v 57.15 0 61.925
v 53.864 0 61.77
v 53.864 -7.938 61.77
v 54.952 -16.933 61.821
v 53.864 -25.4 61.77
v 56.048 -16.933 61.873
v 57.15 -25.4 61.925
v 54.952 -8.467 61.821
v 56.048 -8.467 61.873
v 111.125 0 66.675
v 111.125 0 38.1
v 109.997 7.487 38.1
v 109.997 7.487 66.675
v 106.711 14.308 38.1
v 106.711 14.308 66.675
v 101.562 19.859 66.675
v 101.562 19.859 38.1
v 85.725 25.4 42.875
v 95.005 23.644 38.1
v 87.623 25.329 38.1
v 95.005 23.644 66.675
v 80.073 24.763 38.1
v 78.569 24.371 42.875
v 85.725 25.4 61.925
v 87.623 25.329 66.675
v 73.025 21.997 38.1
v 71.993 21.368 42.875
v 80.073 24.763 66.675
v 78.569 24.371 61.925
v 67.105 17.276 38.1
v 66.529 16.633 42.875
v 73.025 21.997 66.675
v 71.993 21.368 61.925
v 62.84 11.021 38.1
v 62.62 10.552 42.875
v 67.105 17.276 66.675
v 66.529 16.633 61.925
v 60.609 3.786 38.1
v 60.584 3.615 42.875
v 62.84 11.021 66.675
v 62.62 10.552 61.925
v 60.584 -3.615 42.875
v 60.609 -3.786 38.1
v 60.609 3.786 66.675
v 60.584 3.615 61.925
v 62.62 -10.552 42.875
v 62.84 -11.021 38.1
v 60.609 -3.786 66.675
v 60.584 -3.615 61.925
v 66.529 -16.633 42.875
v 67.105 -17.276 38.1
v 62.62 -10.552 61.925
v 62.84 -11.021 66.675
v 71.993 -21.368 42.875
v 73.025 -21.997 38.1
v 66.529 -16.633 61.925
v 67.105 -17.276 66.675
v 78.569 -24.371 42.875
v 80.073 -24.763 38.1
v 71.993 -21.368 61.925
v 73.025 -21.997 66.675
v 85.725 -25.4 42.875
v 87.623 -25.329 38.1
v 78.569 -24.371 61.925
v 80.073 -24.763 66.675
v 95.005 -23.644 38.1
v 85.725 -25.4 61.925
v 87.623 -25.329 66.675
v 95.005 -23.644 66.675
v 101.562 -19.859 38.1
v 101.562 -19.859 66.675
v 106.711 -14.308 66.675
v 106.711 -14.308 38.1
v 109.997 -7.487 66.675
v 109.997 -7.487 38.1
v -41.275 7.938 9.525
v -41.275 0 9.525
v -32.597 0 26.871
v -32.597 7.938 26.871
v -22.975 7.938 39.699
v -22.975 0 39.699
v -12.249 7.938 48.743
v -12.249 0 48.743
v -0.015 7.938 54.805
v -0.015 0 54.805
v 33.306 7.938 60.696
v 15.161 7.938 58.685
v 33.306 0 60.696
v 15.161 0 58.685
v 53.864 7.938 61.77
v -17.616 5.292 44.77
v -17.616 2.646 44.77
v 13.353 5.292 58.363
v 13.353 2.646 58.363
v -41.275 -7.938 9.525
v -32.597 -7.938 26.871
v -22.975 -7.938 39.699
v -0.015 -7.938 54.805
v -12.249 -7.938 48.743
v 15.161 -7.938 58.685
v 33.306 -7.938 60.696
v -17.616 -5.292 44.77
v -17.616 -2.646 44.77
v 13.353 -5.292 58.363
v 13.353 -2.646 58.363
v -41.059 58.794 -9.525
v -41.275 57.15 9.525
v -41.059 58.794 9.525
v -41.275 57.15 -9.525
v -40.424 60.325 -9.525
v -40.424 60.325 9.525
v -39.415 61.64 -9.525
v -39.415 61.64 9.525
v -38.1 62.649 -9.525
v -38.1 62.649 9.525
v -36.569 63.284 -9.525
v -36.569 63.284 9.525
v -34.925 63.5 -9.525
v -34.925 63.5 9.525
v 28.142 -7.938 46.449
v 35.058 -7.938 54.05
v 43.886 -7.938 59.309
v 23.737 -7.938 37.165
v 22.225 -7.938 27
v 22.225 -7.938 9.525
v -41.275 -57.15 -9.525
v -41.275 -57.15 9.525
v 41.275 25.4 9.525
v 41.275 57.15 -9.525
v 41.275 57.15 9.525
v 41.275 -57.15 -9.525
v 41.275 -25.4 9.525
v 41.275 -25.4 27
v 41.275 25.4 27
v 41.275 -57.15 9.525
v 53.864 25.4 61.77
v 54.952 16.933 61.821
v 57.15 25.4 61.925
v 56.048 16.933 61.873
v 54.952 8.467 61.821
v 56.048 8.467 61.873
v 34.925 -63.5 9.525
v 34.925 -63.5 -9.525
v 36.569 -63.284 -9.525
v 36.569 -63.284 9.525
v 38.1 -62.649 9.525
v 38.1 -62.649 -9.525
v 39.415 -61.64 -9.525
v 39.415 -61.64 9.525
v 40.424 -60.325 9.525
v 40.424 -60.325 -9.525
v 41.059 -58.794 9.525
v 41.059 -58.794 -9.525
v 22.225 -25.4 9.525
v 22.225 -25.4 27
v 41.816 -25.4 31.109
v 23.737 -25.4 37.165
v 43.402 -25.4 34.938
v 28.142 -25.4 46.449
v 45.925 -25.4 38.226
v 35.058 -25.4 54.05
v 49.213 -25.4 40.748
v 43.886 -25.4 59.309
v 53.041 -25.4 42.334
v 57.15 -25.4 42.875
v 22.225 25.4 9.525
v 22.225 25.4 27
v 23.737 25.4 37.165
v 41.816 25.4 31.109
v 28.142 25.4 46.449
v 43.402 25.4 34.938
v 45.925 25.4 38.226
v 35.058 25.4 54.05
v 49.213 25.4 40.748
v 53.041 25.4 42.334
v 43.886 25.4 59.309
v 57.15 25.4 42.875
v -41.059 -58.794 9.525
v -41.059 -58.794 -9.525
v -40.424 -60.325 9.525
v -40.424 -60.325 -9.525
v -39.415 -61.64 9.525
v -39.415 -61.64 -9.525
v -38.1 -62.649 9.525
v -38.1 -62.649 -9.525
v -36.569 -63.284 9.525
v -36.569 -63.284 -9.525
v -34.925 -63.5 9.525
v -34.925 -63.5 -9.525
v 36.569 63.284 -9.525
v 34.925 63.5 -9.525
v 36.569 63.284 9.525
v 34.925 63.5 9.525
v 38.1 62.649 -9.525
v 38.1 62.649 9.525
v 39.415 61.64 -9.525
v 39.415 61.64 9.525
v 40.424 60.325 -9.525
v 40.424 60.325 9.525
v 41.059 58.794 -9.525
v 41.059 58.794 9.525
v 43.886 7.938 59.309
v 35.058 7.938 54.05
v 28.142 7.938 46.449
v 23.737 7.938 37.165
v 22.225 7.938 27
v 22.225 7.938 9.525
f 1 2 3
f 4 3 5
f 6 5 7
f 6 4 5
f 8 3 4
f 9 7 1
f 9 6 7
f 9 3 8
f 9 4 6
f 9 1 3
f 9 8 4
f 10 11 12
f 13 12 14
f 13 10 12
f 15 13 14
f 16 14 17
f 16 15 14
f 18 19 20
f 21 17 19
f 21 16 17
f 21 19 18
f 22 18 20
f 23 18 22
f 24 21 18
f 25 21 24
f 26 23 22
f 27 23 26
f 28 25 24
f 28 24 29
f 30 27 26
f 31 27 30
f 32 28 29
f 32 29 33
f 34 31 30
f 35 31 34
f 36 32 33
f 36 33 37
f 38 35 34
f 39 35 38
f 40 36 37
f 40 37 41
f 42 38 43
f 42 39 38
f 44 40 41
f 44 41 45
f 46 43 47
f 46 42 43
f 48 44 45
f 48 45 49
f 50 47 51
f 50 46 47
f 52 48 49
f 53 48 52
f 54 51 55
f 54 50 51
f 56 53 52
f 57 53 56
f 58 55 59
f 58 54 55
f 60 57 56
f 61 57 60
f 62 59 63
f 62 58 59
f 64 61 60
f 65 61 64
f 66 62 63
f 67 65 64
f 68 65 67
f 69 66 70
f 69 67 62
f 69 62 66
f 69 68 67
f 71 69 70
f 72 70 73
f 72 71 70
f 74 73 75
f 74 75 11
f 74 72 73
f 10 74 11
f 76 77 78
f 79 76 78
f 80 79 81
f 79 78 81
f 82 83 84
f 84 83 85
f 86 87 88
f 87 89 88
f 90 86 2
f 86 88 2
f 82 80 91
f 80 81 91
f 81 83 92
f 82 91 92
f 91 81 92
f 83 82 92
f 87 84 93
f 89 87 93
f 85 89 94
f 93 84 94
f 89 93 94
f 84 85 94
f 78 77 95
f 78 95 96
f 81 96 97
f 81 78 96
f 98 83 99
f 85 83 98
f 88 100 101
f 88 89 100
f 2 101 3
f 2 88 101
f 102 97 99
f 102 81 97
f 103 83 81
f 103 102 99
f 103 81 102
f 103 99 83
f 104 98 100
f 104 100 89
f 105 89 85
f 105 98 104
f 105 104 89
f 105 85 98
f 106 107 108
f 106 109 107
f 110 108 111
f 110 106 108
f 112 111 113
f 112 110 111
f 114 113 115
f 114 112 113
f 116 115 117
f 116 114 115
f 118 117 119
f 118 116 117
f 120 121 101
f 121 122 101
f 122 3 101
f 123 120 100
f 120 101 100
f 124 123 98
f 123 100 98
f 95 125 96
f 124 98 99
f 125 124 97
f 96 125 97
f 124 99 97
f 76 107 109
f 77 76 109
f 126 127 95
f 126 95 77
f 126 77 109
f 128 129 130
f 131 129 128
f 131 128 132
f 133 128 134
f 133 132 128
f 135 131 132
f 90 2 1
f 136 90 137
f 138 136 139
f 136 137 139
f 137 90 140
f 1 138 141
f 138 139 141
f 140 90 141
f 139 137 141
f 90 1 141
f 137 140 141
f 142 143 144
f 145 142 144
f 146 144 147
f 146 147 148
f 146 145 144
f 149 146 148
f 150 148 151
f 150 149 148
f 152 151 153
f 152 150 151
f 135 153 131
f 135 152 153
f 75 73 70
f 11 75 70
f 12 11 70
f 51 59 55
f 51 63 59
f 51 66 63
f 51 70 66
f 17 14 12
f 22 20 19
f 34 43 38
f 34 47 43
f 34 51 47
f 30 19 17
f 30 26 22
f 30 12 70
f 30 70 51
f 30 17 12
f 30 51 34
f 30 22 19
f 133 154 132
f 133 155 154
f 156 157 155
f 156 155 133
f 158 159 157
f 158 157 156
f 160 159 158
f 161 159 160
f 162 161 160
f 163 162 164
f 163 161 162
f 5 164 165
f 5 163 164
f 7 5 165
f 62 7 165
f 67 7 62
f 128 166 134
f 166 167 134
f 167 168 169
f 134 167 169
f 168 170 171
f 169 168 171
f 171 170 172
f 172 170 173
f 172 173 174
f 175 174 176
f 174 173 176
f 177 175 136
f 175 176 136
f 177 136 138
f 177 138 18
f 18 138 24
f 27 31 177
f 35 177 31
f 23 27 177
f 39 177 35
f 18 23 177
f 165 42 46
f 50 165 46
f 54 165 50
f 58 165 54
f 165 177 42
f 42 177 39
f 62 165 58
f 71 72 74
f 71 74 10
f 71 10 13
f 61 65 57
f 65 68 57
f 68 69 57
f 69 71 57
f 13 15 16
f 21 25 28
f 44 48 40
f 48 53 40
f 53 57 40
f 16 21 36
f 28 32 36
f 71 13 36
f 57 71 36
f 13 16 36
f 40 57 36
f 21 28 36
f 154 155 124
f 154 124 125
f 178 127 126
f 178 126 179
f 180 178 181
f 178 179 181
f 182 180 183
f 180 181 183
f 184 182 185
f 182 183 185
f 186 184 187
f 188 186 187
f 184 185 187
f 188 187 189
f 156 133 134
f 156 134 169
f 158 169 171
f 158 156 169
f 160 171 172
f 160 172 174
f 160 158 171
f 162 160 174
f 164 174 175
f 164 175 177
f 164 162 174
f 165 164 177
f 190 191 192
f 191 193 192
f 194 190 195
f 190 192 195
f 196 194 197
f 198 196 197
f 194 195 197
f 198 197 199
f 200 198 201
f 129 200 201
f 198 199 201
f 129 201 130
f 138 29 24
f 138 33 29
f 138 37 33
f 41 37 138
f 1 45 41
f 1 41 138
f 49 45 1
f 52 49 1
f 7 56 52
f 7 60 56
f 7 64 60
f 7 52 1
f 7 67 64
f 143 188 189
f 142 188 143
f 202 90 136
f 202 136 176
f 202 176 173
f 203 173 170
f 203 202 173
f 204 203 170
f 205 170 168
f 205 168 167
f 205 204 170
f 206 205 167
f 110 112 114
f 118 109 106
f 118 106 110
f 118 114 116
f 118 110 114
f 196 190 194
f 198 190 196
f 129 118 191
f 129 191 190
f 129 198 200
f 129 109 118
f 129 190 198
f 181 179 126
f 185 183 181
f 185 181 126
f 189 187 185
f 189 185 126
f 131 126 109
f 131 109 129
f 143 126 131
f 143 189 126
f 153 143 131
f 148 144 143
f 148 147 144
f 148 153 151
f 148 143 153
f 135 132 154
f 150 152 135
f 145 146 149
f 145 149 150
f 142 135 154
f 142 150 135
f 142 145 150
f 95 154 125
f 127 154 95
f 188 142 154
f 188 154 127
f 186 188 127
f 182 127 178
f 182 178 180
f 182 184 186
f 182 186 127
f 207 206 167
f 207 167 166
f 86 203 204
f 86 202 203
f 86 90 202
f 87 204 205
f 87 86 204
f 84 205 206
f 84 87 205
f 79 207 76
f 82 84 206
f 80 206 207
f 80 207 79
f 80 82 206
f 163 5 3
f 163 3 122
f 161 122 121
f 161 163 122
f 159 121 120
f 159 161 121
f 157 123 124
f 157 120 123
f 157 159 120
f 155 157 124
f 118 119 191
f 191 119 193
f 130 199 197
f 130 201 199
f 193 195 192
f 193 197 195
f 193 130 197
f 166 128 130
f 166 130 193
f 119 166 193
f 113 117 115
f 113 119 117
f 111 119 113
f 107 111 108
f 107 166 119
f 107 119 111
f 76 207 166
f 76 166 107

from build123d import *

# Parameters (mm, degrees)
F1_DEPTH = 63.5
F0_W     = 25.4
F0_H     = 19.05
F2_DEPTH = 25.4
F0_H_2   = 4.7498
F0_H_3   = 4.7752
F4_DEPTH = 7.9375
F5_R     = 6.35


with BuildPart() as f1:
    # F0 (on Front) → F1 (new body, symmetric)
    with BuildSketch(Plane.XZ):
        Polygon((-41.275, 9.525), (-41.275, -9.525), (41.275, -9.525), (41.275, 9.525), (22.225, 9.525), align=None)
    extrude(amount=F1_DEPTH, both=True)

    # F0 (on Front) → F2 (join, symmetric)
    with BuildSketch(Plane.XZ):
        with BuildLine():
            Line((22.225, 9.525), (41.275, 9.525))
            Line((41.275, 9.525), (41.275, 27.0002))
            ThreePointArc((41.275, 27.0002), (45.9246798487, 38.2255201513), (57.15, 42.8752))
            Line((57.15, 42.8752), (60.325, 42.8752))
            Line((60.325, 42.8752), (60.325, 61.9252))
            Line((60.325, 61.9252), (57.15, 61.9252))
            add(Edge.make_bspline(
                [(53.8635781544, 61.7702310102), (54.9491847021, 61.8205950904), (56.0446147523, 61.8720257258), (57.15, 61.9252)],
                knots=[108.9349794531, 108.9349794531, 108.9349794531, 108.9349794531, 111.5045361635, 111.5045361635, 111.5045361635, 111.5045361635], degree=3))
            ThreePointArc((53.8635781544, 61.7702310102), (31.3184891271, 50.5052775583), (22.225, 27.0002))
            Line((22.225, 27.0002), (22.225, 9.525))
        make_face()
        with Locations((73.025, 52.4002)):
            Rectangle(F0_W, F0_H)
    extrude(amount=F2_DEPTH, both=True)

    # F0 (on Front) → F3 (revolve)
    with BuildSketch(Plane.XZ):
        with Locations((98.425, 64.3001)):
            Rectangle(F0_W, F0_H_2)
        with Locations((98.425, 40.4876)):
            Rectangle(F0_W, F0_H_3)
        with Locations((98.425, 52.4002)):
            Rectangle(F0_W, F0_H)
    revolve(axis=Axis((85.725, 0, 52.3875), (0, 0, 1)))

    # F0 (on Front) → F4 (join, symmetric)
    with BuildSketch(Plane.XZ):
        with BuildLine():
            add(Edge.make_bspline(
                [(-41.275, 9.525), (-20.5281487987, 59.4168244671), (7.8398704502, 59.6350728281), (53.8635781544, 61.7702310102)],
                knots=[0, 0, 0, 0, 108.9349794531, 108.9349794531, 108.9349794531, 108.9349794531], degree=3))
            Line((-41.275, 9.525), (22.225, 9.525))
            Line((22.225, 9.525), (22.225, 27.0002))
            ThreePointArc((22.225, 27.0002), (31.3184891271, 50.5052775583), (53.8635781544, 61.7702310102))
        make_face()
    extrude(amount=F4_DEPTH, both=True)

    # F5
    f5_edges = [f1.edges().sort_by_distance(p)[0] for p in [
        (41.275, -63.5, 0),
        (-41.275, -63.5, 0),
        (41.275, 63.5, 0),
        (-41.275, 63.5, 0),
    ]]
    fillet(f5_edges, radius=F5_R)


solid = f1.part
